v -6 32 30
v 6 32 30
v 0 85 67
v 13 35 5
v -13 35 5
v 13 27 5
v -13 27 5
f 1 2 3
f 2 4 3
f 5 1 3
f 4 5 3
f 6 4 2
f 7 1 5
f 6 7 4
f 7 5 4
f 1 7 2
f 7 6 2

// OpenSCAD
module bodyHalf()
{
	polyhedron(
		points=[ [16,31,5], [0,31,5],   [0,34,23],  [0,35,30], 
                 [18,35,30],[21,34,23], [21,-23,23],[11,-1,49],
                 [0,-1,49], [13,-16,44],[0,-16,44], [0,-23,23],
                 [0,-9,5], [16,-9,5]],

		faces=[ [0,2,1], [0,5,2], [2,5,4], [3,2,4], [4,5,6], 
                [7,8,3], [3,4,7], [4,6,7], [8,7,9], [7,6,9],
                [10,8,9], [6,11,9],[10,9,11],[11,6,12],[6,13,12], 
                [13,5,0], [6,5,13],[0,1,12], [12,13,0]]
	);
}

module tail()
{
	translate([0,-5,0])
		polyhedron(
		points=[ [0,90,67],[6,37,30], [-6,37,30],[13,40,5],
                 [-13,40,5], [13,32,5], [-13,32,5]
				 ],

		faces=[ [0,1,2], [0,3,1], [0,2,4], [0,4,3],[1,3,5],
                [4,2,6], [3,6,5], [3,4,6],[1,6,2], [1,5,6] ]
		);
}

module footLeft()
{
	polyhedron(
		points=[[40,-20,0], [22,-20,0], [22,36,0], [40,36,0],
                [22,36,13], [40,36,8], [40,-20,6], [22,-20,9],
                [40,14,20], [22,14,25], [40,14,0]],

		faces=[ [2,1,0], [0,3,2], [2,3,4], [5,4,3], [1,6,0],
                [6,1,7], [6,7,8], [9,8,7], [9,5,8], [4,5,9],
                [0,6,10], [10,6,8], [5,3,10], [10,8,5], [4,9,2],
				[2,9,1], [1,9,7]
		]
	);
}

module headhalf()
{
	polyhedron(
		points = [[18,-16,44], [0,-16,44], [8,-50,44], [8,-52,46], 
                  [0,-50,44], [0,-52,46],[15,-22,60], [12,-25,67],
                  [0,-25,67], [0,-15,74], [9,-15,74], [12,-6,76],
                  [0,-6,76], [17,-3,67], [18,-10,58], [20,10,53], 
                  [20,14,66], [9,12,80],[0,12,80], [0,14,66],
                  [0,10,53]
		],
		faces = [ [0,1,2], [1,4,2], [2,4,3], [4,5,3], [0,2,6],
                  [8,7,5], [3,5,7], [6,3,7], [2,3,6], [7,10,11],
                  [7,8,10], [8,9,10], [9,11,10], [9,12,11],
                  [6,7,11], [6,11,13], [6,13,14], [6,14,0],
                  [0,14,15], [14,13,15], [13,16,15], [13,17,16],
				  [13,11,17], [11,12,17], [17,12,18], [17,18,19],
                  [19,16,17], [15,16,20],[20,16,19], [20,0,15],
                  [1,0,20],
				]
	);
}

module body()
{
	union()
	{
		bodyHalf();
		mirror([1,0,0])
		{
			bodyHalf();
		}
	}
}

module feet()
{
	union()
	{
		translate([-7,0,0]) footLeft();
		mirror([1,0,0]){
			translate([-7,0,0]) footLeft();
		}
	}
}

module head()
{
	union()
	{
		headhalf();
		mirror([1,0,0])
		{
			headhalf();
		}
	}
}

module porygon()
{   
	union()
	{
		head();
		body();
		tail();
		feet();
	}
}

porygon();
